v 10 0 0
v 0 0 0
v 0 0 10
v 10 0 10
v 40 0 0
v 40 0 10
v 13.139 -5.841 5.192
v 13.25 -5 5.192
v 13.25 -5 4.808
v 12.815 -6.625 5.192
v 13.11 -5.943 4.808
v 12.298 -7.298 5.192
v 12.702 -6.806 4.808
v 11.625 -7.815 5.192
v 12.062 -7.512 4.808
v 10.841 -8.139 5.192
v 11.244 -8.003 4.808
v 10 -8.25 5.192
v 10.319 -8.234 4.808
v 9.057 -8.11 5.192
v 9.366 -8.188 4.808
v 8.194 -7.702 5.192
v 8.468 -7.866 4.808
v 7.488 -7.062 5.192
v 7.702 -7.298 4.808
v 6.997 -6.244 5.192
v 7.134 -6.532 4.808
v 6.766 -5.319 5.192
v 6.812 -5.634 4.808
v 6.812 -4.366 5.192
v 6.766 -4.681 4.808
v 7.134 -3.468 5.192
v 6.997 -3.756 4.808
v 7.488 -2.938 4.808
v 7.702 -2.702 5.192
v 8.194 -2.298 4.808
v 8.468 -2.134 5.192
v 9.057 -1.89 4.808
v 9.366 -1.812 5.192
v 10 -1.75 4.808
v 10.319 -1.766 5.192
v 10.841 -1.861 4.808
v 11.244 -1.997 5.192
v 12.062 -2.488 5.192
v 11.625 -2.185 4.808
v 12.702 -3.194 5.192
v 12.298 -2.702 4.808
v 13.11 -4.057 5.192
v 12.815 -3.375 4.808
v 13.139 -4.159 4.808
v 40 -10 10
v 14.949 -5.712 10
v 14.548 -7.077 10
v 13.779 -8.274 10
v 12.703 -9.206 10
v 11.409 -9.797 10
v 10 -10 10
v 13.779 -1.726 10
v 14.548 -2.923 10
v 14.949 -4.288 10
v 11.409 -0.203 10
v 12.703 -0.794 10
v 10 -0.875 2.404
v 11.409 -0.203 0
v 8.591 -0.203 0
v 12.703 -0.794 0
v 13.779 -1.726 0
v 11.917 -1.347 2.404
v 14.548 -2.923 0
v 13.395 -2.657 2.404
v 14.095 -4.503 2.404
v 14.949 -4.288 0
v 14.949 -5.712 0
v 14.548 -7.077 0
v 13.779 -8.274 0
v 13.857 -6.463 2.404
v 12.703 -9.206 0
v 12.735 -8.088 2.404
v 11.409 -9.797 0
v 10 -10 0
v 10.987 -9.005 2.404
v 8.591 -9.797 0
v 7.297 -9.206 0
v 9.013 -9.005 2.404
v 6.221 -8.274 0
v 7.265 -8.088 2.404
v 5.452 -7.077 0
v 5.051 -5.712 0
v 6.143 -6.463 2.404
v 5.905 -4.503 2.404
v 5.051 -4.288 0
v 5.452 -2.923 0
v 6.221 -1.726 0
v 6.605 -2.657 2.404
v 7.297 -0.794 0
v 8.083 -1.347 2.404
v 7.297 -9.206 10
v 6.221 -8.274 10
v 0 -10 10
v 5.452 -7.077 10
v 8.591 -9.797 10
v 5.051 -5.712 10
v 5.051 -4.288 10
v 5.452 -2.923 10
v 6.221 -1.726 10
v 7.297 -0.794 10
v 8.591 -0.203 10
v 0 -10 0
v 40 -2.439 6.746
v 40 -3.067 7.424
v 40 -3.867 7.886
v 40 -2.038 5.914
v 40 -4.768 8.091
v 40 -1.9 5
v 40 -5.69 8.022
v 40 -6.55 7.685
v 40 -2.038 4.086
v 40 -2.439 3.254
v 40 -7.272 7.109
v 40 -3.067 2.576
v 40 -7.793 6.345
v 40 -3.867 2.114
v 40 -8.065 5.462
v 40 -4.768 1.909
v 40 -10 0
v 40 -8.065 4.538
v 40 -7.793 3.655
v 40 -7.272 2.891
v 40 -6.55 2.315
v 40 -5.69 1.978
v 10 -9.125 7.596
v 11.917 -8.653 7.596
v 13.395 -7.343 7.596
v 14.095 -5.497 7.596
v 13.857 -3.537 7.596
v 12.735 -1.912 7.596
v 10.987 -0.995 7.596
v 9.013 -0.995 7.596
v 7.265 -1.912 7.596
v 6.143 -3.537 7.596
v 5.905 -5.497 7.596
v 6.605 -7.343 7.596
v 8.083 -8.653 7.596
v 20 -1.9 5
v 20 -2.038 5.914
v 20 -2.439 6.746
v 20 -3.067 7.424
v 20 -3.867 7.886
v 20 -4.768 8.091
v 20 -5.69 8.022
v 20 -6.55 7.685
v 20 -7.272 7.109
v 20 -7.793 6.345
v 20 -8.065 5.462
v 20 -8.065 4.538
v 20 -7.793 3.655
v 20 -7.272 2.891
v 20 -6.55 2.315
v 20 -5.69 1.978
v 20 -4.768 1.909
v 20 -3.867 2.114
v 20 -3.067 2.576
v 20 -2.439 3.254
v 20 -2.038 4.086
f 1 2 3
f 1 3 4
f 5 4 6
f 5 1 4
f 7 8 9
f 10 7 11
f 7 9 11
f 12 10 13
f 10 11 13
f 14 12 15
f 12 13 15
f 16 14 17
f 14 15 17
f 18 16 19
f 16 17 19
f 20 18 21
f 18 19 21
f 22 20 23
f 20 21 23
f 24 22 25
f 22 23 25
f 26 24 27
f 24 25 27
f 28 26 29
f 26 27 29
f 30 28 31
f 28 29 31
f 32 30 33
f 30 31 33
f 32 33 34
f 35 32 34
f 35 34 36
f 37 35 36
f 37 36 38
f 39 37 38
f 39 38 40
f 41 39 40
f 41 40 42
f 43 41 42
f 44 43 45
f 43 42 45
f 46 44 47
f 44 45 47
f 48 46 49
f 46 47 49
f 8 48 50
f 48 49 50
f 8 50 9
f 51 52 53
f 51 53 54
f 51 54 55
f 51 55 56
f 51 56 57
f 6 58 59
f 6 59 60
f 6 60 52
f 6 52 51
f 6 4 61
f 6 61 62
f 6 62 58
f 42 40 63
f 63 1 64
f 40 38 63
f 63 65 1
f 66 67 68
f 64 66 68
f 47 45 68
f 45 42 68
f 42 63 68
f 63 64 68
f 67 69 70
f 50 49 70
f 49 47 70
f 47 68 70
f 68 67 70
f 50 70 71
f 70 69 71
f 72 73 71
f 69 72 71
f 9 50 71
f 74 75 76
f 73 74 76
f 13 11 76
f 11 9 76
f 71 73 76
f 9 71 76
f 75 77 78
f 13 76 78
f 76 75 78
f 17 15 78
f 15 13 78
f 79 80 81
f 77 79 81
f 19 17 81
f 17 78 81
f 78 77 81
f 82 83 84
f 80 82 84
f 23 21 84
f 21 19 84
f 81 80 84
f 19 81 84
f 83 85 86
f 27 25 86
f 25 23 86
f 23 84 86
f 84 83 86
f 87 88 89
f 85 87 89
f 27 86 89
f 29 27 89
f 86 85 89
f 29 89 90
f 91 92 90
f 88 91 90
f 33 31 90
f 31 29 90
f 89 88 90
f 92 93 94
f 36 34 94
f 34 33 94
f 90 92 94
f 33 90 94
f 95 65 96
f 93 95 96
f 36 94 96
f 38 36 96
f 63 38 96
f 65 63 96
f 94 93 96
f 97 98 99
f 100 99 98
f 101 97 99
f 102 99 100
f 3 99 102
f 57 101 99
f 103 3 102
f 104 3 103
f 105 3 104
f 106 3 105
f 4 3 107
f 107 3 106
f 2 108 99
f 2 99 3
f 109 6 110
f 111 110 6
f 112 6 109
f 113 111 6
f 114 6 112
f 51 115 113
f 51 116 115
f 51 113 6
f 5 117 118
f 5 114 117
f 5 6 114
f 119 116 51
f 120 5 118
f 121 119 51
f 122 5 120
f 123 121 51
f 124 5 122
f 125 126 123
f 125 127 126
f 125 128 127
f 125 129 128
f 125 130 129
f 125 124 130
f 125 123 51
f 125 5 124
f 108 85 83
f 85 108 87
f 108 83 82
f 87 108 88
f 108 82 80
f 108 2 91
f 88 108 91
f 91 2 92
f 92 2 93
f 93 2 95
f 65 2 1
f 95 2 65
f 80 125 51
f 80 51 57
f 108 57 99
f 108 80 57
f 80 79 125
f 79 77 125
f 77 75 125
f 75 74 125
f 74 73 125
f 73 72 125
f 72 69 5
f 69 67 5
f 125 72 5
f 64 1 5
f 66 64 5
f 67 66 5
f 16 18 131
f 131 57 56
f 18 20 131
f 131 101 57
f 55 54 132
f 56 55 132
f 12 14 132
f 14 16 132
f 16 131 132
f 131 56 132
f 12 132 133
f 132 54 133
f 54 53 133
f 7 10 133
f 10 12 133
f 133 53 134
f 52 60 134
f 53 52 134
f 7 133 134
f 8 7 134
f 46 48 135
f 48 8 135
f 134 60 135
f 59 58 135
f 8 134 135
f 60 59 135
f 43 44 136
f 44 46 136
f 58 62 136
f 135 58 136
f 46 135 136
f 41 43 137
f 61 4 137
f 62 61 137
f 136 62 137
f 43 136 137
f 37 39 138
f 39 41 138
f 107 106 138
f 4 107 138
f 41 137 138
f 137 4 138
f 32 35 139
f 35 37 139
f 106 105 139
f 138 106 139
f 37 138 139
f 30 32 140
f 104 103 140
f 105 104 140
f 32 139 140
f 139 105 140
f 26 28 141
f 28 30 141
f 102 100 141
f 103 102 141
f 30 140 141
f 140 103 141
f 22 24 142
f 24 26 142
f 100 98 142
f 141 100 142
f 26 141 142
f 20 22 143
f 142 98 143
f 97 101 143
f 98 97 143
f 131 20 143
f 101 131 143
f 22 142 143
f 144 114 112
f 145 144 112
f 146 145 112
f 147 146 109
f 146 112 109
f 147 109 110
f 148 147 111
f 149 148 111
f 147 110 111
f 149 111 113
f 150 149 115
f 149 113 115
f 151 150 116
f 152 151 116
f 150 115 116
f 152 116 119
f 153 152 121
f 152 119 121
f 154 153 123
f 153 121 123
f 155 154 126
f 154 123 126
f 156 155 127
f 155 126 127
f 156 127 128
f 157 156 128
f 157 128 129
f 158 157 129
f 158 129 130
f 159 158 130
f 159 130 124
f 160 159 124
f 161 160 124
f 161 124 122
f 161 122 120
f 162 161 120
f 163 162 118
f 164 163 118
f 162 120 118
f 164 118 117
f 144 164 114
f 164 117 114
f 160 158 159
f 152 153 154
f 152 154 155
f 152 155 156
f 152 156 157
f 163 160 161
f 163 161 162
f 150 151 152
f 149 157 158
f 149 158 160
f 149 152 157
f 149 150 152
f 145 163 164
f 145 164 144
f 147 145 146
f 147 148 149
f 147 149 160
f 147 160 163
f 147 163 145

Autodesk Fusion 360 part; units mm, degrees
sketch "Esquisse1" plane through (0, 0, 0) normal (0, 0, 1) x (1, 0, 0)
  line L0 (0, 0) -> (40, 0)
  line L1 (40, 0) -> (40, -10)
  line L2 (40, -10) -> (0, -10)
  line L3 (0, -10) -> (0, 0)
  circle A0 centre (10, -5) radius 3.25
  dimension "d1" = 6.5
extrude "Extrusion1" add sketch "Esquisse1" along normal blind 10
sketch "Esquisse2" plane through (40, 0, 0) normal (1, 0, 0) x (0, 1, 0)
  line L0 (-10, 0) -> (0, 0)
  line L1 (0, 0) -> (0, 10)
  line L2 (0, 10) -> (-10, 10)
  line L3 (-10, 10) -> (-10, 0)
  circle A0 centre (-5, 5) radius 3.1
  dimension "d4" = 6.2
extrude "Extrusion2" cut sketch "Esquisse2" against normal blind 20 contours A0
sketch "Esquisse3" plane through (0, 0, 10) normal (0, 0, 1) x (-1, 0, 0)
  circle A0 centre (-10, 5) radius 3.25
  line L0 (0, 10) -> (-40, 10)
  line L1 (-40, 10) -> (-40, 0)
  line L2 (-40, 0) -> (0, 0)
  line L3 (0, 0) -> (0, 10)
sketch "Esquisse4" plane through (0, 0, 0) normal (0, 0, -1) x (1, 0, 0)
  circle A0 centre (10, 5) radius 3.25
  line L0 (40, 10) -> (0, 10)
  line L1 (0, 10) -> (0, 0)
  line L2 (0, 0) -> (40, 0)
  line L3 (40, 0) -> (40, 10)
sketch "Esquisse5" plane through (0, 0, 10) normal (0, 0, 1) x (-1, 0, 0)
  circle A0 centre (-10, 5) radius 3.25
  dimension "d7" = 6.5
hole "Perçage1" at (10, -5, 10) direction (0, 0, -1) diameter 6.5 depth 73.51 tip angle 118 countersink diameter 10 countersink angle 40
sketch "Esquisse6" plane through (0, 0, 0) normal (0, 0, -1) x (1, 0, 0)
  circle A0 centre (10, 5) radius 3.25
  dimension "d13" = 6.5
hole "Perçage2" at (10, -5, 0) direction (0, 0, 1) diameter 6.5 depth 73.51 tip angle 118 countersink diameter 10 countersink angle 40
